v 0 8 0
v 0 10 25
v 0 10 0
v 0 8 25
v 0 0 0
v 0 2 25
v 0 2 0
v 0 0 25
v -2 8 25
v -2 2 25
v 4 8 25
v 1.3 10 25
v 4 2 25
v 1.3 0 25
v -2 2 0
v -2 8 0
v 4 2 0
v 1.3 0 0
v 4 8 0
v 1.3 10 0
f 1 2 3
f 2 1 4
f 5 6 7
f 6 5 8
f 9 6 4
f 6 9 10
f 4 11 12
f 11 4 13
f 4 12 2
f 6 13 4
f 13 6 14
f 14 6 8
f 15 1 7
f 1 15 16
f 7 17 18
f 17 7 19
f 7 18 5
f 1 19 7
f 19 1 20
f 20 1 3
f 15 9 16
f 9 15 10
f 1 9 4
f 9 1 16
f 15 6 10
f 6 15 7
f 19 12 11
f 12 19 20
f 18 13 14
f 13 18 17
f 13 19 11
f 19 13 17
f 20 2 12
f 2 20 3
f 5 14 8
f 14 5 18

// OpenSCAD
//v1.2
length = 25;
width = 2;
// fine adjustment
A = 10;
B = 6;
C = 1.3;
D = 4;
E = 6;
module bracket(){
            translate([-width, A/2-E/2, 0]) cube([width, E, length]);
            linear_extrude(length){
                polygon([[0,0], [0,A], [C,A], [D,(A-B)/2+B], [D,(A-B)/2], [C,0]]);
            }
        }
bracket();
